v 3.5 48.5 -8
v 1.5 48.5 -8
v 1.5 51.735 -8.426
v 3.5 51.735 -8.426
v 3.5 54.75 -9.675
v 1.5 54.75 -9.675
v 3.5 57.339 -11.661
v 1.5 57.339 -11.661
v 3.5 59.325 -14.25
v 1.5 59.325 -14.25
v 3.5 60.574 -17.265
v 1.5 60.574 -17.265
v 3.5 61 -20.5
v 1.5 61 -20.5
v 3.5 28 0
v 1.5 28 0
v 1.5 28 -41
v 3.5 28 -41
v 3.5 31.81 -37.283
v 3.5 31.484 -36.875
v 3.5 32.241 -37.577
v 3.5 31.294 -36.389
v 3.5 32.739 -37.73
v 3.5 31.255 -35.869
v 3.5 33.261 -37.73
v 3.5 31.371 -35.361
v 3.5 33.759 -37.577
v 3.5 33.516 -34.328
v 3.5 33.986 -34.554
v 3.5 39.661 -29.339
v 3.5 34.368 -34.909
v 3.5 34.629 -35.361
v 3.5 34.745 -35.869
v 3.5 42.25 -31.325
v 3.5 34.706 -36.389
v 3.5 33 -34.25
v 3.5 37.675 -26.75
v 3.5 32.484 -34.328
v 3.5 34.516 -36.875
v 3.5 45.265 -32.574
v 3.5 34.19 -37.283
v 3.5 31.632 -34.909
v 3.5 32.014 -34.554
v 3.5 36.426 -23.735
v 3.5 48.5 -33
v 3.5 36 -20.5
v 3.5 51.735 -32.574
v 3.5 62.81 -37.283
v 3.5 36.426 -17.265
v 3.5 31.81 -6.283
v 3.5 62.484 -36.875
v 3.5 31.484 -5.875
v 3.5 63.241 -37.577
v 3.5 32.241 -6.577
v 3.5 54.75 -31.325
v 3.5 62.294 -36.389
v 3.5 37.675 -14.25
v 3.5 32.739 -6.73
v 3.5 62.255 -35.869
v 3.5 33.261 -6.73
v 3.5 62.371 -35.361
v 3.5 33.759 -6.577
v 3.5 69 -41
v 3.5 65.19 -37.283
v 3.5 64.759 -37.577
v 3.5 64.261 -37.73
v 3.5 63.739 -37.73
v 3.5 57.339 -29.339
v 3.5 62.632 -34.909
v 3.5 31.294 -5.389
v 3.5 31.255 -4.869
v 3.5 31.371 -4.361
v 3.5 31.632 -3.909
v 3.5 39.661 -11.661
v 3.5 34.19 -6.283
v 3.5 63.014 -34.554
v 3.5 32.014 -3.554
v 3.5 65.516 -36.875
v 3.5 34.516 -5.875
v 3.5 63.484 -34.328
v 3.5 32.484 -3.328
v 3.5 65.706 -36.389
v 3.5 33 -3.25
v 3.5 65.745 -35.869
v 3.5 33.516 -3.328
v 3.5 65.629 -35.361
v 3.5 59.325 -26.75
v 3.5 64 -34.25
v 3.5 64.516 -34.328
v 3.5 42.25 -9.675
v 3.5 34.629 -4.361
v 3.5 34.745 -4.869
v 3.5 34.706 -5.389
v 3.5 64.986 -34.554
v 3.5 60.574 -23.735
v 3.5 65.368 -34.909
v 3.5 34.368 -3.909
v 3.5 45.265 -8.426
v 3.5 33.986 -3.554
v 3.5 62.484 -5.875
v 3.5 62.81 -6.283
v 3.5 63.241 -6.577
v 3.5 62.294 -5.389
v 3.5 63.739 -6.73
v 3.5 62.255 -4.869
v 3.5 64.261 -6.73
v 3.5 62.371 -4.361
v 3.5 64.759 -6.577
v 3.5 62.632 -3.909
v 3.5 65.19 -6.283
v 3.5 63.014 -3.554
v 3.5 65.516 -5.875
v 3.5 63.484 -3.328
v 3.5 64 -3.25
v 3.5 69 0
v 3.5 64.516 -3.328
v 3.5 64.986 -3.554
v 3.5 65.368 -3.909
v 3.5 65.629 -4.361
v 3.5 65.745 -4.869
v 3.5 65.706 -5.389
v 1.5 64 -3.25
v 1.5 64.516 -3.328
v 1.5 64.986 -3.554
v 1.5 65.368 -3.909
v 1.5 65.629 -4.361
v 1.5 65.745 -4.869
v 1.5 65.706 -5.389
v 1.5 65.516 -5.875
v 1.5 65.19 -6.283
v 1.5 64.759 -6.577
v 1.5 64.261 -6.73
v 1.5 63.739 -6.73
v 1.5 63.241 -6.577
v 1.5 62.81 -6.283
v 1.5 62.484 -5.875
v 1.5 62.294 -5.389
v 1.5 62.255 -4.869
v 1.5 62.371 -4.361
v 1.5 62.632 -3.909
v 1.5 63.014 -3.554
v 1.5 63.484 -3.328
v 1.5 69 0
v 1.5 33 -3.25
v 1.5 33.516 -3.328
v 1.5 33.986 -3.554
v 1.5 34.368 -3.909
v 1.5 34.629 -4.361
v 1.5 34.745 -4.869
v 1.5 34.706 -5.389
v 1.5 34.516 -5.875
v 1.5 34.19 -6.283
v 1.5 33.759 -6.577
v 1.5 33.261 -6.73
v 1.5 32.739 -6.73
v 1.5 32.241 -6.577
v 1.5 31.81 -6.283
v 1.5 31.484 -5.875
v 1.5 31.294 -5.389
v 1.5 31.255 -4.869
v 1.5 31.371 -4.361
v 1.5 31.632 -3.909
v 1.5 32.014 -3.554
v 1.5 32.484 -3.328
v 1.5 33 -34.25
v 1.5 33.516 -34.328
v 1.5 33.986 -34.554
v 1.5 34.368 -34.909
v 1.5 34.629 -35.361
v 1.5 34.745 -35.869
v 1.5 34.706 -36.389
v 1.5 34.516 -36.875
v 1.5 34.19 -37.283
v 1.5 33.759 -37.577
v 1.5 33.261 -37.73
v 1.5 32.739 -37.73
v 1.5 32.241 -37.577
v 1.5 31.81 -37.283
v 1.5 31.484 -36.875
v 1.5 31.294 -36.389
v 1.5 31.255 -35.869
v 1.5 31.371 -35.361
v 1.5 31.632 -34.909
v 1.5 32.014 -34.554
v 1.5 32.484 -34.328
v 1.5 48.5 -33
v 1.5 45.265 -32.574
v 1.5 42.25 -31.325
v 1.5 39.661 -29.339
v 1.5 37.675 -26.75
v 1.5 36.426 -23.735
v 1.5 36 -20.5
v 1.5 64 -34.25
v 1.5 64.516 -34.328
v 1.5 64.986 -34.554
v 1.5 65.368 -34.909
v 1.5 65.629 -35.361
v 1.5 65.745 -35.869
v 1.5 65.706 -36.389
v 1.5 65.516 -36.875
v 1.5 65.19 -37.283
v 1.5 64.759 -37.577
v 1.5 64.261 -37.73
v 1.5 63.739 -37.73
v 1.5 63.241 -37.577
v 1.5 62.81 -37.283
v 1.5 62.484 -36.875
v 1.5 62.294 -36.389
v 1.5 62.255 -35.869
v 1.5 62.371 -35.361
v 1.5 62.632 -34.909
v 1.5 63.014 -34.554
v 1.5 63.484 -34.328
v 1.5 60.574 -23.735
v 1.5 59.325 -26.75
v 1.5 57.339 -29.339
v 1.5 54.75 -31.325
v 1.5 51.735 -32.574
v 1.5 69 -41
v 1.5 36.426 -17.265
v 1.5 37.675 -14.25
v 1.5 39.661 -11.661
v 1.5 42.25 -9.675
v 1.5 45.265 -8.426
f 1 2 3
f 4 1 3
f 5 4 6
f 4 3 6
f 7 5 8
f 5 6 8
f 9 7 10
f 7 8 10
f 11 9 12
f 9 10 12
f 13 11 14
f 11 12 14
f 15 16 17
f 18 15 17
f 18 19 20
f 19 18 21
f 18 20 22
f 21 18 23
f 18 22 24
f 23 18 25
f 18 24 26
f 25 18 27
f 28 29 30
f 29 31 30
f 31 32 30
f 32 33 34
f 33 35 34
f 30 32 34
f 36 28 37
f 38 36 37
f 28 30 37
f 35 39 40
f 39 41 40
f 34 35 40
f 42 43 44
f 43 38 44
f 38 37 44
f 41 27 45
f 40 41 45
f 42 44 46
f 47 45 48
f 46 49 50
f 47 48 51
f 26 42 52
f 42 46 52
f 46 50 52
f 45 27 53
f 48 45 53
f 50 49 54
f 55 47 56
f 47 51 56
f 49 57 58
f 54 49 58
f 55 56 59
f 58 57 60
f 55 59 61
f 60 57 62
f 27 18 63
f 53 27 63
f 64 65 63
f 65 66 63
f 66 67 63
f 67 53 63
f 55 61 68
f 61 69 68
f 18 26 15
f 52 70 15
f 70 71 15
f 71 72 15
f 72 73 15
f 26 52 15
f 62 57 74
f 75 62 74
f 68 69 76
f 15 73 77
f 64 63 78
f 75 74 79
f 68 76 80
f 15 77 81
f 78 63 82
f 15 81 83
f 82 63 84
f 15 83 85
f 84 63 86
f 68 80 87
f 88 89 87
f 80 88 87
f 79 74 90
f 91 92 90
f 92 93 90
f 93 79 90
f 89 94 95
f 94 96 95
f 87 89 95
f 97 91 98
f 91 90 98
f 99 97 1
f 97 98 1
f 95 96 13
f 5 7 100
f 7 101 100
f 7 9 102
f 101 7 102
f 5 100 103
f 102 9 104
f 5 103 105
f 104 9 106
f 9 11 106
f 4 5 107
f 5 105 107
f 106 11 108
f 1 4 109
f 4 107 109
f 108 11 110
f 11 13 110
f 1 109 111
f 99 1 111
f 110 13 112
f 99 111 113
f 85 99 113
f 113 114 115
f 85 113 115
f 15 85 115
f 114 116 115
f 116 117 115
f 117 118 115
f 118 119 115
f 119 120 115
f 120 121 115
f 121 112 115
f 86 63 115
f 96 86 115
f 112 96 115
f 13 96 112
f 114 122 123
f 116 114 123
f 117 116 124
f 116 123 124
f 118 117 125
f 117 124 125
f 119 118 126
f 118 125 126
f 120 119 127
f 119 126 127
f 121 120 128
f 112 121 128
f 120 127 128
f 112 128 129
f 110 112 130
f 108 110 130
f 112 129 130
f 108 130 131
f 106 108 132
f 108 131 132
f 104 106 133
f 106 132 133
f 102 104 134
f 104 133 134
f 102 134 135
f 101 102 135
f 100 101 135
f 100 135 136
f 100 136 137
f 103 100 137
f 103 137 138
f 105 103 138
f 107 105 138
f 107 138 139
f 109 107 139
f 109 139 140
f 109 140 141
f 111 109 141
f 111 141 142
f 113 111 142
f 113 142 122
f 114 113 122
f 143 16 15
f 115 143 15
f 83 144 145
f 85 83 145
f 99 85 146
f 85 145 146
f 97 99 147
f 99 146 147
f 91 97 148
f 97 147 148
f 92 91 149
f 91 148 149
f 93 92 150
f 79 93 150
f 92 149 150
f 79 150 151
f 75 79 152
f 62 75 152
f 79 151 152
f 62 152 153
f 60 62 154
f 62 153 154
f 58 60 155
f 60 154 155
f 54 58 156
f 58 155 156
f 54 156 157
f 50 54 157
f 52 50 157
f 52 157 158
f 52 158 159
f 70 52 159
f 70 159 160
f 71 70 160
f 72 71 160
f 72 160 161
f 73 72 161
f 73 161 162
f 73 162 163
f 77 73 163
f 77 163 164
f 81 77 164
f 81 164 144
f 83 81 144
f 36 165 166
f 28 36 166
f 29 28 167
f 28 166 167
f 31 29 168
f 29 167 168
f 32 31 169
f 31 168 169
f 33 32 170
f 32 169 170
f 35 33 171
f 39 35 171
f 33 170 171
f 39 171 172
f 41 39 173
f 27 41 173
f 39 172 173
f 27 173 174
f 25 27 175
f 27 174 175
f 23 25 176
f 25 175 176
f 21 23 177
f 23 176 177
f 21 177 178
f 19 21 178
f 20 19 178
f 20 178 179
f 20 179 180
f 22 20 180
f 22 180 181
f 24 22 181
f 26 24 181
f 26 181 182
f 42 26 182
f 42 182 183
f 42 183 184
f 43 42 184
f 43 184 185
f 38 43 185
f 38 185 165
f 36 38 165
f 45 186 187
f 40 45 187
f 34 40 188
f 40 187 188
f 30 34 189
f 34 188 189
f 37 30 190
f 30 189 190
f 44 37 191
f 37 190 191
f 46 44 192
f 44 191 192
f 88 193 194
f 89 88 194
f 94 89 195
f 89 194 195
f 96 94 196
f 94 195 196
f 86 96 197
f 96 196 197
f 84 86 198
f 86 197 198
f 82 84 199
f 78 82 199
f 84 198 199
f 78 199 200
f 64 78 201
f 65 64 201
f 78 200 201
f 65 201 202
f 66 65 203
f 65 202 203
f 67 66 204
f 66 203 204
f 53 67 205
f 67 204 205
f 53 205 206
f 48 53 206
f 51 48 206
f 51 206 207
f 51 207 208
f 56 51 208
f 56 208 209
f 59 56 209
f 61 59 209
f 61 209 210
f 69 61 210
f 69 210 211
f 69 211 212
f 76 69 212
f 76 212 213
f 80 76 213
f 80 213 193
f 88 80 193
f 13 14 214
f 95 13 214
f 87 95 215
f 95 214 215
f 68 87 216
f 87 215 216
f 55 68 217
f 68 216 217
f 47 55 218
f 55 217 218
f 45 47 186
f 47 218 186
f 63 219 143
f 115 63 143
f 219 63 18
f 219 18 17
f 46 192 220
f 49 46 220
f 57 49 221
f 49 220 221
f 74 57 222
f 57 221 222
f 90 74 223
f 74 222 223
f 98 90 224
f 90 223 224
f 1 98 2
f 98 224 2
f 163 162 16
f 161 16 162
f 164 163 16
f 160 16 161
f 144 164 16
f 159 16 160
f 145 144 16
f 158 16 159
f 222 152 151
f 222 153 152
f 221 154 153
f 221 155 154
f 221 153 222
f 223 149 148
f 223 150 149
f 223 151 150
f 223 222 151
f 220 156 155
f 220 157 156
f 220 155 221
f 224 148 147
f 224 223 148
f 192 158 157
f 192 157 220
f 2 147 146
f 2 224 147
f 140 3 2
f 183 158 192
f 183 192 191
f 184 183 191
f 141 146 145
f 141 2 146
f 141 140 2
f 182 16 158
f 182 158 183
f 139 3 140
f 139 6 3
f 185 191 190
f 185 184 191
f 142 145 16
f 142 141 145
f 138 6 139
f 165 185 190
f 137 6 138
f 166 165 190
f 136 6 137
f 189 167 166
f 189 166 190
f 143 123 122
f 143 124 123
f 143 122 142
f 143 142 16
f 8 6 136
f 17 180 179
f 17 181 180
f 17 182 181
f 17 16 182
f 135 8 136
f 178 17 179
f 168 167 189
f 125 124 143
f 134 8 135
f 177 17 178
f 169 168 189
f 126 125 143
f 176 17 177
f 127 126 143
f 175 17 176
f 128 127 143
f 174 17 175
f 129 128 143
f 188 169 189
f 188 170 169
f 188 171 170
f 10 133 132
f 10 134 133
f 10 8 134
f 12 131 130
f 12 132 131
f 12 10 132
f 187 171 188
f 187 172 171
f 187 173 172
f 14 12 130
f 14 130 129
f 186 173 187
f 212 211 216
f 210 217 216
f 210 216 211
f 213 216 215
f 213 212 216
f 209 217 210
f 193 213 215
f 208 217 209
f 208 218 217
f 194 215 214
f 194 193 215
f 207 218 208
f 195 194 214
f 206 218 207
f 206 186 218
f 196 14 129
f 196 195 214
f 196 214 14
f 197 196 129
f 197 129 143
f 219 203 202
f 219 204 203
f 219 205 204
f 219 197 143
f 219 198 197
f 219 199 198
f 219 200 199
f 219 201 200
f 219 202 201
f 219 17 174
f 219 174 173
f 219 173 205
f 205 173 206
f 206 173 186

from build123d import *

# Parameters (mm, degrees)
BOSS_EXTRUDE2_DEPTH          = 8
BOSS_EXTRUDE2_DEPTH_BACK     = 1
SKETCH1_R                    = 2.5
CUT_EXTRUDE1_DEPTH           = 79.300702423
CUT_EXTRUDE1_DEPTH_BACK      = 79.300702423
SKETCH2_R                    = 2.5
SKETCH3_R                    = 3.25
CUT_EXTRUDE5_DEPTH           = 15
CUT_EXTRUDE5_DRAFT           = -0.0573
CUT_EXTRUDE5_PROFILE_2_DEPTH = 15
CUT_EXTRUDE5_PROFILE_2_DRAFT = -0.0573
SKETCH5_W                    = 4.5
SKETCH5_H                    = 6.5
BOSS_EXTRUDE3_DEPTH          = 14.5
SKETCH6_R                    = 4
CUT_EXTRUDE4_DEPTH           = 1.5
SKETCH12_W                   = 10.5
SKETCH12_H                   = 30
BOSS_EXTRUDE7_DEPTH          = 9
SKETCH15_W                   = 9
SKETCH15_H                   = 6.5
BOSS_EXTRUDE8_DEPTH          = 3.5
BOSS_EXTRUDE9_DEPTH          = 54
FILLET4_R                    = 5
SKETCH18_W                   = 9.873697418
SKETCH18_H                   = 6.5
BOSS_EXTRUDE11_DEPTH         = 0.5
SKETCH20_W                   = 4
SKETCH20_H                   = 17.5
BOSS_EXTRUDE12_DEPTH         = 18
BOSS_EXTRUDE13_DEPTH         = 11
BOSS_EXTRUDE13_DEPTH_BACK    = 4
SKETCH22_W                   = 17.5
SKETCH22_H                   = 4
SKETCH25_W                   = 2
SKETCH25_H                   = 17.5
BOSS_EXTRUDE14_DEPTH         = 41
SKETCH28_W                   = 41
SKETCH28_H                   = 45
BOSS_EXTRUDE15_DEPTH         = 2
SKETCH29_R                   = 1.75
CUT_EXTRUDE8_DEPTH           = 9
BOSS_EXTRUDE16_DEPTH         = 9
BOSS_EXTRUDE16_DEPTH_BACK    = 4
SKETCH30_W                   = 17.5
SKETCH30_H                   = 2
CUT_EXTRUDE9_DEPTH           = 9
SKETCH32_W                   = 13
SKETCH32_H                   = 4
BOSS_EXTRUDE17_DEPTH         = 23.5
SKETCH33_W                   = 0.5
SKETCH33_H                   = 17.5
BOSS_EXTRUDE18_DEPTH         = 20
SKETCH34_W                   = 4.5
SKETCH34_H                   = 25
SKETCH34_W_2                 = 15.5
SKETCH34_H_2                 = 4
SKETCH34_W_3                 = 9
BOSS_EXTRUDE19_DEPTH         = 26
SKETCH35_W                   = 9.873697418
SKETCH35_H                   = 0.5
BOSS_EXTRUDE20_DEPTH         = 47.5
BOSS_EXTRUDE21_DEPTH         = 47.5
SKETCH38_W                   = 0.419549816
SKETCH38_H                   = 18.5
CUT_EXTRUDE10_DEPTH          = 90.5
SKETCH39_W                   = 4
SKETCH39_H                   = 4
BOSS_EXTRUDE23_DEPTH         = 47.5
SKETCH46_W                   = 22.5
SKETCH46_H                   = 9
SKETCH46_W_2                 = 5
BOSS_EXTRUDE26_DEPTH         = 11.5
SKETCH47_W                   = 27.5
SKETCH47_H                   = 9
BOSS_EXTRUDE27_DEPTH         = 11
SKETCH48_W                   = 5
SKETCH48_H                   = 6.5
BOSS_EXTRUDE31_DEPTH         = 18.5
SKETCH50_R                   = 4
CUT_EXTRUDE11_DEPTH          = 1.5
SKETCH51_W                   = 9.626242636
SKETCH51_H                   = 9.125298808
BOSS_EXTRUDE32_DEPTH         = 1.5
BOSS_EXTRUDE35_DEPTH         = 47.5
SKETCH55_W                   = 9.873697418
SKETCH55_H                   = 0.5
CUT_EXTRUDE12_DEPTH          = 47.5
SKETCH56_W                   = 0.5
SKETCH56_H                   = 20
BOSS_EXTRUDE36_DEPTH         = 43.5
BOSS_EXTRUDE37_DEPTH         = 47.5
SKETCH58_W                   = 0.715052156
SKETCH58_H                   = 9.51279705
CUT_EXTRUDE13_DEPTH          = 4
CUT_EXTRUDE15_DEPTH          = 47.5
SKETCH60_W                   = 0.215052156
SKETCH60_H                   = 9.51279705
CUT_EXTRUDE16_DEPTH          = 47.5
CUT_EXTRUDE17_DEPTH          = 47.5
SKETCH62_W                   = 8
SKETCH62_H                   = 8
CUT_EXTRUDE18_DEPTH          = 47.5
SKETCH63_W                   = 13
SKETCH63_H                   = 4
CUT_EXTRUDE20_DEPTH          = 17
SKETCH64_W                   = 1
SKETCH64_H                   = 1.5
BOSS_EXTRUDE38_DEPTH         = 6.5
SKETCH65_W                   = 7
SKETCH65_H                   = 3
CUT_EXTRUDE21_DEPTH          = 1.5
BOSS_EXTRUDE39_START         = -2
BOSS_EXTRUDE39_DEPTH         = 2
CUT_EXTRUDE22_DEPTH          = 155
CUT_EXTRUDE23_DEPTH          = 97.458540317
CUT_EXTRUDE23_DEPTH_BACK     = 97.458540317
SKETCH69_W                   = 41
SKETCH69_H                   = 4
SKETCH69_W_2                 = 26
CUT_EXTRUDE24_DEPTH          = 95.562148876


with BuildPart() as part:
    # Sketch1 → Boss-Extrude2 (new, two sides: drawn at the far end of the back side and taken through both)
    with BuildSketch(Plane(origin=(0, 0, 0), x_dir=(1, 0, 0), z_dir=(0, 1, 0)).offset(-BOSS_EXTRUDE2_DEPTH_BACK)):
        with BuildLine():
            Line((5, 0), (50, 0))
            ThreePointArc((50, 0), (53.535533906, 1.464466094), (55, 5))
            Line((55, 5), (55, 50))
            ThreePointArc((55, 50), (53.535533906, 53.535533906), (50, 55))
            Line((50, 55), (5, 55))
            ThreePointArc((5, 55), (1.464466094, 53.535533906), (0, 50))
            Line((0, 50), (0, 5))
            ThreePointArc((0, 5), (1.464466094, 1.464466094), (5, 0))
        make_face()
        with Locations(Location((7.5, 47.5, 0), (0, 0, 270))):
            Circle(SKETCH1_R, mode=Mode.SUBTRACT)
        with Locations(Location((47.5, 47.5, 0), (0, 0, 270))):
            Circle(SKETCH1_R, mode=Mode.SUBTRACT)
        with Locations(Location((47.5, 7.5, 0), (0, 0, 270))):
            Circle(SKETCH1_R, mode=Mode.SUBTRACT)
        with Locations(Location((7.5, 7.5, 0), (0, 0, 270))):
            Circle(SKETCH1_R, mode=Mode.SUBTRACT)
    extrude(amount=BOSS_EXTRUDE2_DEPTH + BOSS_EXTRUDE2_DEPTH_BACK)

    # Sketch2 → Cut-Extrude1 (cut, two sides: drawn at the far end of the back side and taken through both)
    with BuildSketch(Plane(origin=(0, 8, 0), x_dir=(1, 0, 0), z_dir=(0, 1, 0)).offset(-CUT_EXTRUDE1_DEPTH_BACK)):
        with BuildLine():
            Line((0, 50), (0, 27.5))
            Line((0, 27.5), (55, 27.5))
            Line((55, 27.5), (55, 50))
            ThreePointArc((55, 50), (53.535533906, 53.535533906), (50, 55))
            Line((50, 55), (5, 55))
            ThreePointArc((5, 55), (1.464466094, 53.535533906), (0, 50))
        make_face()
        with Locations((7.5, 47.5)):
            Circle(SKETCH2_R, mode=Mode.SUBTRACT)
        with Locations((47.5, 47.5)):
            Circle(SKETCH2_R, mode=Mode.SUBTRACT)
    extrude(amount=CUT_EXTRUDE1_DEPTH + CUT_EXTRUDE1_DEPTH_BACK, mode=Mode.SUBTRACT)


with BuildPart() as cut_extrude5_tool:
    # Sketch3 → Cut-Extrude5 (with draft: the straight prism first)
    with BuildSketch(Plane(origin=(0, 0, -27.5), x_dir=(-1, 0, 0), z_dir=(0, 0, -1))):
        with Locations((-37.5, 3.5)):
            Circle(SKETCH3_R)
    extrude(amount=-CUT_EXTRUDE5_DEPTH)
    # Cut-Extrude5: the draft: its side faces are tilted about the plane it starts from
    cut_extrude5_sides = [cut_extrude5_tool.faces().sort_by_distance(p)[0] for p in [
        (40.75, 3.5, -20),
    ]]
    draft(cut_extrude5_sides, Plane(origin=(0, 0, -27.5), x_dir=(-1, 0, 0), z_dir=(0, 0, -1)), CUT_EXTRUDE5_DRAFT)


with BuildPart() as part_1:
    add(part.part)

    # Cut-Extrude5: cut by cut_extrude5_tool
    add(cut_extrude5_tool.part, mode=Mode.SUBTRACT)


with BuildPart() as cut_extrude5_profile_2_tool:
    # Sketch3 → Cut-Extrude5 profile 2 (with draft: the straight prism first)
    with BuildSketch(Plane(origin=(0, 0, -27.5), x_dir=(-1, 0, 0), z_dir=(0, 0, -1))):
        with Locations((-17.5, 3.5)):
            Circle(SKETCH3_R)
    extrude(amount=-CUT_EXTRUDE5_PROFILE_2_DEPTH)
    # Cut-Extrude5 profile 2: the draft: its side faces are tilted about the plane it starts from
    cut_extrude5_profile_2_sides = [cut_extrude5_profile_2_tool.faces().sort_by_distance(p)[0] for p in [
        (20.75, 3.5, -20),
    ]]
    draft(cut_extrude5_profile_2_sides, Plane(origin=(0, 0, -27.5), x_dir=(-1, 0, 0), z_dir=(0, 0, -1)), CUT_EXTRUDE5_PROFILE_2_DRAFT)


with BuildPart() as part_2:
    add(part_1.part)

    # Cut-Extrude5 profile 2: cut by cut_extrude5_profile_2_tool
    add(cut_extrude5_profile_2_tool.part, mode=Mode.SUBTRACT)

    # Sketch5 → Boss-Extrude3 (add)
    with BuildSketch(Plane(origin=(0, 8, 0), x_dir=(1, 0, 0), z_dir=(0, 1, 0))):
        with Locations((25.25, 20.75)):
            Rectangle(SKETCH5_W, SKETCH5_H)
        with Locations((29.75, 20.75)):
            Rectangle(SKETCH5_W, SKETCH5_H)
    extrude(amount=BOSS_EXTRUDE3_DEPTH)

    # Sketch6 → Cut-Extrude4 (cut)
    with BuildSketch(Plane(origin=(0, 0, -24), x_dir=(-1, 0, 0), z_dir=(0, 0, -1))):
        with Locations((-27.5, 17)):
            Circle(SKETCH6_R)
    extrude(amount=-CUT_EXTRUDE4_DEPTH, mode=Mode.SUBTRACT)

    # Sketch12 → Boss-Extrude7 (add)
    with BuildSketch(Plane(origin=(0, 8, 0), x_dir=(1, 0, 0), z_dir=(0, 1, 0))):
        with Locations((32.75, -15)):
            Rectangle(SKETCH12_W, SKETCH12_H)
        with Locations((22.25, -15)):
            Rectangle(SKETCH12_W, SKETCH12_H)
    extrude(amount=-BOSS_EXTRUDE7_DEPTH)

    # Sketch15 → Boss-Extrude8 (add)
    with BuildSketch(Plane(origin=(0, 22.5, 0), x_dir=(1, 0, 0), z_dir=(0, 1, 0))):
        with Locations((27.5, 20.75)):
            Rectangle(SKETCH15_W, SKETCH15_H)
    extrude(amount=BOSS_EXTRUDE8_DEPTH)

    # Sketch11 → Boss-Extrude9 (add)
    with BuildSketch(Plane(origin=(0, 0, -24), x_dir=(-1, 0, 0), z_dir=(0, 0, -1))):
        Polygon((-32.436848709, 26), (-29.5, 22.5), (-29.5, 26), align=None)
        Polygon((-29.5, 22.5), (-27.5, 22.5), (-25.5, 22.5), (-25.5, 26), (-29.5, 26), align=None)
        Polygon((-25.5, 26), (-25.5, 22.5), (-22.563151291, 26), align=None)
    extrude(amount=-BOSS_EXTRUDE9_DEPTH)

    # Fillet4
    fillet4_edges = [part_2.edges().sort_by_distance(p)[0] for p in [
        (27.5, -1, 30),
    ]]
    fillet(fillet4_edges, radius=FILLET4_R)

    # Sketch18 → Boss-Extrude11 (add)
    with BuildSketch(Plane(origin=(0, 26, 0), x_dir=(1, 0, 0), z_dir=(0, 1, 0))):
        with Locations((27.5, 20.75)):
            Rectangle(SKETCH18_W, SKETCH18_H)
    extrude(amount=BOSS_EXTRUDE11_DEPTH)

    # Sketch20 → Boss-Extrude12 (add)
    with BuildSketch(Plane(origin=(0, 8, 0), x_dir=(1, 0, 0), z_dir=(0, 1, 0))):
        with Locations((14.5, 8.75)):
            Rectangle(SKETCH20_W, SKETCH20_H)
        with Locations((40.5, 8.75)):
            Rectangle(SKETCH20_W, SKETCH20_H)
    extrude(amount=BOSS_EXTRUDE12_DEPTH)

    # Sketch22 → Boss-Extrude13 (add, two sides: drawn at the far end of the back side and taken through both)
    with BuildSketch(Plane.ZY.offset(-12.5).offset(-BOSS_EXTRUDE13_DEPTH_BACK)):
        with Locations((-8.75, 26)):
            Rectangle(SKETCH22_W, SKETCH22_H)
    extrude(amount=BOSS_EXTRUDE13_DEPTH + BOSS_EXTRUDE13_DEPTH_BACK)

    # Sketch25 → Boss-Extrude14 (add)
    with BuildSketch(Plane(origin=(0, 28, 0), x_dir=(1, 0, 0), z_dir=(0, 1, 0))):
        with Locations((2.5, 8.75)):
            Rectangle(SKETCH25_W, SKETCH25_H)
    extrude(amount=BOSS_EXTRUDE14_DEPTH)

    # Sketch28 → Boss-Extrude15 (add)
    with BuildSketch(Plane.ZY.offset(-1.5)):
        with Locations((-20.5, 46.5)):
            Rectangle(SKETCH28_W, SKETCH28_H)
    extrude(amount=-BOSS_EXTRUDE15_DEPTH)

    # Sketch29 → Cut-Extrude8 (cut)
    with BuildSketch(Plane.ZY.offset(-1.5)):
        with Locations((-36, 33)):
            Circle(SKETCH29_R)
        with Locations((-5, 64)):
            Circle(SKETCH29_R)
        with Locations((-5, 33)):
            Circle(SKETCH29_R)
        with Locations((-36, 64)):
            Circle(SKETCH29_R)
    extrude(amount=-CUT_EXTRUDE8_DEPTH, mode=Mode.SUBTRACT)

    # Sketch30 → Boss-Extrude16 (add, two sides: drawn at the far end of the back side and taken through both)
    with BuildSketch(Plane(origin=(42.5, 0, 0), x_dir=(0, 0, -1), z_dir=(1, 0, 0)).offset(-BOSS_EXTRUDE16_DEPTH_BACK)):
        with Locations((8.75, 25)):
            Rectangle(SKETCH30_W, SKETCH30_H)
        with Locations((8.75, 27)):
            Rectangle(SKETCH30_W, SKETCH30_H)
    extrude(amount=BOSS_EXTRUDE16_DEPTH + BOSS_EXTRUDE16_DEPTH_BACK)

    # Sketch31 → Cut-Extrude9 (cut)
    with BuildSketch(Plane(origin=(3.5, 0, 0), x_dir=(0, 0, -1), z_dir=(1, 0, 0))):
        with BuildLine():
            ThreePointArc((30.5, 47), (27.571067812, 54.071067812), (20.5, 57))
            Line((20.5, 57), (20.5, 47))
            Line((20.5, 47), (30.5, 47))
        make_face()
        with BuildLine():
            Line((20.5, 47), (20.5, 57))
            ThreePointArc((20.5, 57), (13.428932188, 39.928932188), (30.5, 47))
            Line((30.5, 47), (20.5, 47))
        make_face()
    extrude(amount=-CUT_EXTRUDE9_DEPTH, mode=Mode.SUBTRACT)

    # Sketch32 → Boss-Extrude17 (add)
    with BuildSketch(Plane(origin=(0, 0, -17.5), x_dir=(-1, 0, 0), z_dir=(0, 0, -1))):
        with Locations((-10, 26)):
            Rectangle(SKETCH32_W, SKETCH32_H)
    extrude(amount=BOSS_EXTRUDE17_DEPTH)

    # Sketch33 → Boss-Extrude18 (add)
    with BuildSketch(Plane(origin=(0, 8, 0), x_dir=(1, 0, 0), z_dir=(0, 1, 0))):
        with Locations((38.25, 8.75)):
            Rectangle(SKETCH33_W, SKETCH33_H)
        with Locations((16.75, 8.75)):
            Rectangle(SKETCH33_W, SKETCH33_H)
    extrude(amount=BOSS_EXTRUDE18_DEPTH)

    # Sketch34 → Boss-Extrude19 (add)
    with BuildSketch(Plane.XY):
        with Locations((14.75, 11.5)):
            Rectangle(SKETCH34_W, SKETCH34_H)
        with Locations((9.25, 26)):
            Rectangle(SKETCH34_W_2, SKETCH34_H_2)
        Polygon((42.5, 24), (42.5, 28), (38, 28), (38, 8), (38, -1), (42.5, -1), (42.5, 8), align=None)
        with Locations((47, 26)):
            Rectangle(SKETCH34_W_3, SKETCH34_H_2)
    extrude(amount=BOSS_EXTRUDE19_DEPTH)

    # Sketch35 → Boss-Extrude20 (add)
    with BuildSketch(Plane.XY.offset(-17.5)):
        with Locations((27.5, 26.25)):
            Rectangle(SKETCH35_W, SKETCH35_H)
    extrude(amount=BOSS_EXTRUDE20_DEPTH)

    # Sketch37 → Boss-Extrude21 (add)
    with BuildSketch(Plane.XY.offset(-17.5)):
        Polygon((23, 8), (25.5, 8), (25.5, 12), (23, 9.020616019), align=None)
        Polygon((25.5, 8), (27.5, 8), (29.5, 8), (29.5, 12), (25.5, 12), align=None)
        Polygon((29.5, 12), (29.5, 8), (32, 8), (32, 9.020616019), align=None)
        Polygon((29.5, 8), (27.5, 8), (25.5, 8), (23, 8), (23, 9.020616019), (21.863844179, 7.666598237), (33.136155821, 7.666598237), (32, 9.020616019), (32, 8), align=None)
    extrude(amount=BOSS_EXTRUDE21_DEPTH)

    # Sketch38 → Cut-Extrude10 (cut)
    with BuildSketch(Plane.XY.offset(30)):
        with Locations((22.353376383, 17.25)):
            Rectangle(SKETCH38_W, SKETCH38_H)
        with Locations((32.646623617, 17.25)):
            Rectangle(SKETCH38_W, SKETCH38_H)
    extrude(amount=-CUT_EXTRUDE10_DEPTH, mode=Mode.SUBTRACT)

    # Sketch39 → Boss-Extrude23 (add)
    with BuildSketch(Plane.XY.offset(30)):
        Polygon((21, 19.25), (17.715052156, 22.006398525), (17, 22.006398525), (17, 19.25), align=None)
        with Locations((19, 17.25)):
            Rectangle(SKETCH39_W, SKETCH39_H)
        Polygon((17.715052156, 12.493601475), (21, 15.25), (17, 15.25), (17, 12.493601475), align=None)
        Polygon((37.284947844, 12.493601475), (38, 12.493601475), (38, 15.25), (34, 15.25), align=None)
        Polygon((38, 17.25), (38, 19.25), (34, 19.25), (34, 15.25), (38, 15.25), align=None)
        Polygon((38, 19.25), (38, 22.006398525), (37.284947844, 22.006398525), (34, 19.25), align=None)
    extrude(amount=-BOSS_EXTRUDE23_DEPTH)

    # Sketch46 → Boss-Extrude26 (add)
    with BuildSketch(Plane.ZY):
        with Locations((-16.25, 3.5)):
            Rectangle(SKETCH46_W, SKETCH46_H)
        with Locations((-2.5, 3.5)):
            Rectangle(SKETCH46_W_2, SKETCH46_H)
    extrude(amount=-BOSS_EXTRUDE26_DEPTH)

    # Sketch47 → Boss-Extrude27 (add)
    with BuildSketch(Plane.ZY):
        with Locations((-13.75, 3.5)):
            Rectangle(SKETCH47_W, SKETCH47_H)
    extrude(amount=BOSS_EXTRUDE27_DEPTH)

    # Sketch48 → Boss-Extrude31 (add)
    with BuildSketch(Plane(origin=(0, 8, 0), x_dir=(1, 0, 0), z_dir=(0, 1, 0))):
        Polygon((42.5, 17.5), (42.5, 24), (32, 24), (32, 17.5), (32.436848709, 17.5), (38, 17.5), align=None)
        with Locations((45, 20.75)):
            Rectangle(SKETCH48_W, SKETCH48_H)
        Polygon((12.5, 24), (12.5, 17.5), (17, 17.5), (22.563151291, 17.5), (23, 17.5), (23, 24), align=None)
        with Locations((10, 20.75)):
            Rectangle(SKETCH48_W, SKETCH48_H)
    extrude(amount=BOSS_EXTRUDE31_DEPTH)

    # Sketch50 → Cut-Extrude11 (cut)
    with BuildSketch(Plane(origin=(0, 0, -24), x_dir=(-1, 0, 0), z_dir=(0, 0, -1))):
        with Locations((-17.5, 17)):
            Circle(SKETCH50_R)
        with Locations((-37.5, 17)):
            Circle(SKETCH50_R)
    extrude(amount=-CUT_EXTRUDE11_DEPTH, mode=Mode.SUBTRACT)

    # Sketch51 → Boss-Extrude32 (add)
    with BuildSketch(Plane(origin=(0, 0, -24), x_dir=(-1, 0, 0), z_dir=(0, 0, -1))):
        with Locations((-27.646184708, 17.114099589)):
            Rectangle(SKETCH51_W, SKETCH51_H)
    extrude(amount=-BOSS_EXTRUDE32_DEPTH)

    # Sketch54 → Boss-Extrude35 (add)
    with BuildSketch(Plane.XY.offset(-17.5)):
        Polygon((29.5, 22.5), (27.5, 22.5), (27.5, 14.5), (31.5, 14.5), (31.5, 22.5), align=None)
        Polygon((27.5, 14.5), (27.5, 22.5), (25.5, 22.5), (23.5, 22.5), (23.5, 14.5), align=None)
    extrude(amount=BOSS_EXTRUDE35_DEPTH)

    # Sketch55 → Cut-Extrude12 (cut)
    with BuildSketch(Plane.XY.offset(30)):
        with Locations((27.5, 26.25)):
            Rectangle(SKETCH55_W, SKETCH55_H)
    extrude(amount=-CUT_EXTRUDE12_DEPTH, mode=Mode.SUBTRACT)

    # Sketch56 → Boss-Extrude36 (add)
    with BuildSketch(Plane.XY.offset(26)):
        with Locations((37.75, 18)):
            Rectangle(SKETCH56_W, SKETCH56_H)
        with Locations((17.25, 18)):
            Rectangle(SKETCH56_W, SKETCH56_H)
    extrude(amount=-BOSS_EXTRUDE36_DEPTH)

    # Sketch57 → Boss-Extrude37 (add)
    with BuildSketch(Plane.XY.offset(30)):
        Polygon((35, 23.436848709), (31.5, 20.5), (31.5, 20.428787517), (35, 20.428787517), align=None)
        Polygon((35, 20.428787517), (31.5, 20.428787517), (31.5, 18.5), (35, 18.5), (35, 18.535606241), align=None)
        Polygon((35, 18.5), (31.5, 18.5), (31.5, 16.5), (35, 16.5), (35, 18.464393759), align=None)
        Polygon((35, 16.5), (31.5, 16.5), (35, 13.563151291), align=None)
        Polygon((32.436848709, 11), (29.5, 14.5), (25.5, 14.5), (22.563151291, 11), align=None)
        Polygon((20, 16.5), (23.5, 16.5), (23.5, 18.5), (23.5, 20.5), (20, 23.436848709), (20, 18.535606241), (20, 18.464393759), align=None)
        Polygon((20, 13.563151291), (23.5, 16.5), (20, 16.5), align=None)
    extrude(amount=-BOSS_EXTRUDE37_DEPTH)

    # Sketch58 → Cut-Extrude13 (cut)
    with BuildSketch(Plane.XY.offset(30)):
        with Locations((37.642473922, 17.25)):
            Rectangle(SKETCH58_W, SKETCH58_H)
        with Locations((17.357526078, 17.25)):
            Rectangle(SKETCH58_W, SKETCH58_H)
    extrude(amount=-CUT_EXTRUDE13_DEPTH, mode=Mode.SUBTRACT)

    # Sketch59 → Cut-Extrude15 (cut)
    with BuildSketch(Plane.XY.offset(30)):
        Polygon((37.284947844, 22.006398525), (35, 20.089099631), (35, 14.410900369), (37.284947844, 12.493601475), align=None)
        Polygon((17.715052156, 22.006398525), (20, 20.089099631), (20, 14.410900369), (17.715052156, 12.493601475), align=None)
    extrude(amount=-CUT_EXTRUDE15_DEPTH, mode=Mode.SUBTRACT)

    # Sketch60 → Cut-Extrude16 (cut)
    with BuildSketch(Plane.XY.offset(26)):
        with Locations((37.392473922, 17.25)):
            Rectangle(SKETCH60_W, SKETCH60_H)
        with Locations((17.607526078, 17.25)):
            Rectangle(SKETCH60_W, SKETCH60_H)
    extrude(amount=-CUT_EXTRUDE16_DEPTH, mode=Mode.SUBTRACT)

    # Sketch61 → Cut-Extrude17 (cut)
    with BuildSketch(Plane.XY.offset(30)):
        Polygon((32.436848709, 8), (22.563151291, 8), (22.563151291, 8.5), (24.660900369, 11), (30.339099631, 11), (32.436848709, 8.5), align=None)
    extrude(amount=-CUT_EXTRUDE17_DEPTH, mode=Mode.SUBTRACT)

    # Sketch62 → Cut-Extrude18 (cut)
    with BuildSketch(Plane.XY.offset(30)):
        with Locations((27.5, 18.5)):
            Rectangle(SKETCH62_W, SKETCH62_H)
    extrude(amount=-CUT_EXTRUDE18_DEPTH, mode=Mode.SUBTRACT)

    # Sketch63 → Cut-Extrude20 (cut)
    with BuildSketch(Plane(origin=(0, 0, -41), x_dir=(-1, 0, 0), z_dir=(0, 0, -1))):
        with Locations((-10, 26)):
            Rectangle(SKETCH63_W, SKETCH63_H)
    extrude(amount=-CUT_EXTRUDE20_DEPTH, mode=Mode.SUBTRACT)

    # Sketch64 → Boss-Extrude38 (add)
    with BuildSketch(Plane(origin=(0, 0, -17.5), x_dir=(-1, 0, 0), z_dir=(0, 0, -1))):
        with Locations((-17, 27.25)):
            Rectangle(SKETCH64_W, SKETCH64_H)
    extrude(amount=BOSS_EXTRUDE38_DEPTH)

    # Sketch65 → Cut-Extrude21 (cut)
    with BuildSketch(Plane(origin=(0, 28, 0), x_dir=(1, 0, 0), z_dir=(0, 1, 0))):
        with Locations((48, 16)):
            Rectangle(SKETCH65_W, SKETCH65_H)
    extrude(amount=-CUT_EXTRUDE21_DEPTH, mode=Mode.SUBTRACT)

    # Sketch66 → Boss-Extrude39 (add)
    with BuildSketch(Plane.ZY.offset(-1.5).offset(BOSS_EXTRUDE39_START)):
        with BuildLine():
            ThreePointArc((-30.5, 47), (-20.5, 37), (-10.5, 47))
            Line((-10.5, 47), (-30.5, 47))
        make_face()
        with BuildLine():
            Line((-30.5, 47), (-10.5, 47))
            ThreePointArc((-10.5, 47), (-20.5, 57), (-30.5, 47))
        make_face()
    extrude(amount=BOSS_EXTRUDE39_DEPTH)

    # Sketch67 → Cut-Extrude22 (cut)
    with BuildSketch(Plane.ZY.offset(-1.5)):
        with BuildLine():
            ThreePointArc((-33, 48.5), (-29.338834765, 39.661165235), (-20.5, 36))
            Line((-20.5, 36), (-20.5, 48.5))
            Line((-20.5, 48.5), (-33, 48.5))
        make_face()
        with BuildLine():
            Line((-20.5, 48.5), (-20.5, 36))
            ThreePointArc((-20.5, 36), (-11.661165235, 39.661165235), (-8, 48.5))
            Line((-8, 48.5), (-20.5, 48.5))
        make_face()
        with BuildLine():
            Line((-33, 48.5), (-20.5, 48.5))
            Line((-20.5, 48.5), (-20.5, 61))
            ThreePointArc((-20.5, 61), (-29.338834765, 57.338834765), (-33, 48.5))
        make_face()
        with BuildLine():
            Line((-20.5, 61), (-20.5, 48.5))
            Line((-20.5, 48.5), (-8, 48.5))
            ThreePointArc((-8, 48.5), (-11.661165235, 57.338834765), (-20.5, 61))
        make_face()
    extrude(amount=-CUT_EXTRUDE22_DEPTH, mode=Mode.SUBTRACT)

    # Sketch68 → Cut-Extrude23 (cut, two sides: drawn at the far end of the back side and taken through both)
    with BuildSketch(Plane.ZY.offset(-1.5).offset(-CUT_EXTRUDE23_DEPTH_BACK)):
        Polygon((26, 24), (0, 24), (-41, 24), (-41, -3.723852661), (62.997520678, -3.723852661), (62.997520678, 28), (26, 28), align=None)
    extrude(amount=CUT_EXTRUDE23_DEPTH + CUT_EXTRUDE23_DEPTH_BACK, mode=Mode.SUBTRACT)

    # Sketch69 → Cut-Extrude24 (cut, through all)
    with BuildSketch(Plane.ZY.offset(-1.5)):
        with Locations((-20.5, 26)):
            Rectangle(SKETCH69_W, SKETCH69_H)
        with Locations((13, 26)):
            Rectangle(SKETCH69_W_2, SKETCH69_H)
    extrude(amount=-CUT_EXTRUDE24_DEPTH, mode=Mode.SUBTRACT)


solid = part_2.part
